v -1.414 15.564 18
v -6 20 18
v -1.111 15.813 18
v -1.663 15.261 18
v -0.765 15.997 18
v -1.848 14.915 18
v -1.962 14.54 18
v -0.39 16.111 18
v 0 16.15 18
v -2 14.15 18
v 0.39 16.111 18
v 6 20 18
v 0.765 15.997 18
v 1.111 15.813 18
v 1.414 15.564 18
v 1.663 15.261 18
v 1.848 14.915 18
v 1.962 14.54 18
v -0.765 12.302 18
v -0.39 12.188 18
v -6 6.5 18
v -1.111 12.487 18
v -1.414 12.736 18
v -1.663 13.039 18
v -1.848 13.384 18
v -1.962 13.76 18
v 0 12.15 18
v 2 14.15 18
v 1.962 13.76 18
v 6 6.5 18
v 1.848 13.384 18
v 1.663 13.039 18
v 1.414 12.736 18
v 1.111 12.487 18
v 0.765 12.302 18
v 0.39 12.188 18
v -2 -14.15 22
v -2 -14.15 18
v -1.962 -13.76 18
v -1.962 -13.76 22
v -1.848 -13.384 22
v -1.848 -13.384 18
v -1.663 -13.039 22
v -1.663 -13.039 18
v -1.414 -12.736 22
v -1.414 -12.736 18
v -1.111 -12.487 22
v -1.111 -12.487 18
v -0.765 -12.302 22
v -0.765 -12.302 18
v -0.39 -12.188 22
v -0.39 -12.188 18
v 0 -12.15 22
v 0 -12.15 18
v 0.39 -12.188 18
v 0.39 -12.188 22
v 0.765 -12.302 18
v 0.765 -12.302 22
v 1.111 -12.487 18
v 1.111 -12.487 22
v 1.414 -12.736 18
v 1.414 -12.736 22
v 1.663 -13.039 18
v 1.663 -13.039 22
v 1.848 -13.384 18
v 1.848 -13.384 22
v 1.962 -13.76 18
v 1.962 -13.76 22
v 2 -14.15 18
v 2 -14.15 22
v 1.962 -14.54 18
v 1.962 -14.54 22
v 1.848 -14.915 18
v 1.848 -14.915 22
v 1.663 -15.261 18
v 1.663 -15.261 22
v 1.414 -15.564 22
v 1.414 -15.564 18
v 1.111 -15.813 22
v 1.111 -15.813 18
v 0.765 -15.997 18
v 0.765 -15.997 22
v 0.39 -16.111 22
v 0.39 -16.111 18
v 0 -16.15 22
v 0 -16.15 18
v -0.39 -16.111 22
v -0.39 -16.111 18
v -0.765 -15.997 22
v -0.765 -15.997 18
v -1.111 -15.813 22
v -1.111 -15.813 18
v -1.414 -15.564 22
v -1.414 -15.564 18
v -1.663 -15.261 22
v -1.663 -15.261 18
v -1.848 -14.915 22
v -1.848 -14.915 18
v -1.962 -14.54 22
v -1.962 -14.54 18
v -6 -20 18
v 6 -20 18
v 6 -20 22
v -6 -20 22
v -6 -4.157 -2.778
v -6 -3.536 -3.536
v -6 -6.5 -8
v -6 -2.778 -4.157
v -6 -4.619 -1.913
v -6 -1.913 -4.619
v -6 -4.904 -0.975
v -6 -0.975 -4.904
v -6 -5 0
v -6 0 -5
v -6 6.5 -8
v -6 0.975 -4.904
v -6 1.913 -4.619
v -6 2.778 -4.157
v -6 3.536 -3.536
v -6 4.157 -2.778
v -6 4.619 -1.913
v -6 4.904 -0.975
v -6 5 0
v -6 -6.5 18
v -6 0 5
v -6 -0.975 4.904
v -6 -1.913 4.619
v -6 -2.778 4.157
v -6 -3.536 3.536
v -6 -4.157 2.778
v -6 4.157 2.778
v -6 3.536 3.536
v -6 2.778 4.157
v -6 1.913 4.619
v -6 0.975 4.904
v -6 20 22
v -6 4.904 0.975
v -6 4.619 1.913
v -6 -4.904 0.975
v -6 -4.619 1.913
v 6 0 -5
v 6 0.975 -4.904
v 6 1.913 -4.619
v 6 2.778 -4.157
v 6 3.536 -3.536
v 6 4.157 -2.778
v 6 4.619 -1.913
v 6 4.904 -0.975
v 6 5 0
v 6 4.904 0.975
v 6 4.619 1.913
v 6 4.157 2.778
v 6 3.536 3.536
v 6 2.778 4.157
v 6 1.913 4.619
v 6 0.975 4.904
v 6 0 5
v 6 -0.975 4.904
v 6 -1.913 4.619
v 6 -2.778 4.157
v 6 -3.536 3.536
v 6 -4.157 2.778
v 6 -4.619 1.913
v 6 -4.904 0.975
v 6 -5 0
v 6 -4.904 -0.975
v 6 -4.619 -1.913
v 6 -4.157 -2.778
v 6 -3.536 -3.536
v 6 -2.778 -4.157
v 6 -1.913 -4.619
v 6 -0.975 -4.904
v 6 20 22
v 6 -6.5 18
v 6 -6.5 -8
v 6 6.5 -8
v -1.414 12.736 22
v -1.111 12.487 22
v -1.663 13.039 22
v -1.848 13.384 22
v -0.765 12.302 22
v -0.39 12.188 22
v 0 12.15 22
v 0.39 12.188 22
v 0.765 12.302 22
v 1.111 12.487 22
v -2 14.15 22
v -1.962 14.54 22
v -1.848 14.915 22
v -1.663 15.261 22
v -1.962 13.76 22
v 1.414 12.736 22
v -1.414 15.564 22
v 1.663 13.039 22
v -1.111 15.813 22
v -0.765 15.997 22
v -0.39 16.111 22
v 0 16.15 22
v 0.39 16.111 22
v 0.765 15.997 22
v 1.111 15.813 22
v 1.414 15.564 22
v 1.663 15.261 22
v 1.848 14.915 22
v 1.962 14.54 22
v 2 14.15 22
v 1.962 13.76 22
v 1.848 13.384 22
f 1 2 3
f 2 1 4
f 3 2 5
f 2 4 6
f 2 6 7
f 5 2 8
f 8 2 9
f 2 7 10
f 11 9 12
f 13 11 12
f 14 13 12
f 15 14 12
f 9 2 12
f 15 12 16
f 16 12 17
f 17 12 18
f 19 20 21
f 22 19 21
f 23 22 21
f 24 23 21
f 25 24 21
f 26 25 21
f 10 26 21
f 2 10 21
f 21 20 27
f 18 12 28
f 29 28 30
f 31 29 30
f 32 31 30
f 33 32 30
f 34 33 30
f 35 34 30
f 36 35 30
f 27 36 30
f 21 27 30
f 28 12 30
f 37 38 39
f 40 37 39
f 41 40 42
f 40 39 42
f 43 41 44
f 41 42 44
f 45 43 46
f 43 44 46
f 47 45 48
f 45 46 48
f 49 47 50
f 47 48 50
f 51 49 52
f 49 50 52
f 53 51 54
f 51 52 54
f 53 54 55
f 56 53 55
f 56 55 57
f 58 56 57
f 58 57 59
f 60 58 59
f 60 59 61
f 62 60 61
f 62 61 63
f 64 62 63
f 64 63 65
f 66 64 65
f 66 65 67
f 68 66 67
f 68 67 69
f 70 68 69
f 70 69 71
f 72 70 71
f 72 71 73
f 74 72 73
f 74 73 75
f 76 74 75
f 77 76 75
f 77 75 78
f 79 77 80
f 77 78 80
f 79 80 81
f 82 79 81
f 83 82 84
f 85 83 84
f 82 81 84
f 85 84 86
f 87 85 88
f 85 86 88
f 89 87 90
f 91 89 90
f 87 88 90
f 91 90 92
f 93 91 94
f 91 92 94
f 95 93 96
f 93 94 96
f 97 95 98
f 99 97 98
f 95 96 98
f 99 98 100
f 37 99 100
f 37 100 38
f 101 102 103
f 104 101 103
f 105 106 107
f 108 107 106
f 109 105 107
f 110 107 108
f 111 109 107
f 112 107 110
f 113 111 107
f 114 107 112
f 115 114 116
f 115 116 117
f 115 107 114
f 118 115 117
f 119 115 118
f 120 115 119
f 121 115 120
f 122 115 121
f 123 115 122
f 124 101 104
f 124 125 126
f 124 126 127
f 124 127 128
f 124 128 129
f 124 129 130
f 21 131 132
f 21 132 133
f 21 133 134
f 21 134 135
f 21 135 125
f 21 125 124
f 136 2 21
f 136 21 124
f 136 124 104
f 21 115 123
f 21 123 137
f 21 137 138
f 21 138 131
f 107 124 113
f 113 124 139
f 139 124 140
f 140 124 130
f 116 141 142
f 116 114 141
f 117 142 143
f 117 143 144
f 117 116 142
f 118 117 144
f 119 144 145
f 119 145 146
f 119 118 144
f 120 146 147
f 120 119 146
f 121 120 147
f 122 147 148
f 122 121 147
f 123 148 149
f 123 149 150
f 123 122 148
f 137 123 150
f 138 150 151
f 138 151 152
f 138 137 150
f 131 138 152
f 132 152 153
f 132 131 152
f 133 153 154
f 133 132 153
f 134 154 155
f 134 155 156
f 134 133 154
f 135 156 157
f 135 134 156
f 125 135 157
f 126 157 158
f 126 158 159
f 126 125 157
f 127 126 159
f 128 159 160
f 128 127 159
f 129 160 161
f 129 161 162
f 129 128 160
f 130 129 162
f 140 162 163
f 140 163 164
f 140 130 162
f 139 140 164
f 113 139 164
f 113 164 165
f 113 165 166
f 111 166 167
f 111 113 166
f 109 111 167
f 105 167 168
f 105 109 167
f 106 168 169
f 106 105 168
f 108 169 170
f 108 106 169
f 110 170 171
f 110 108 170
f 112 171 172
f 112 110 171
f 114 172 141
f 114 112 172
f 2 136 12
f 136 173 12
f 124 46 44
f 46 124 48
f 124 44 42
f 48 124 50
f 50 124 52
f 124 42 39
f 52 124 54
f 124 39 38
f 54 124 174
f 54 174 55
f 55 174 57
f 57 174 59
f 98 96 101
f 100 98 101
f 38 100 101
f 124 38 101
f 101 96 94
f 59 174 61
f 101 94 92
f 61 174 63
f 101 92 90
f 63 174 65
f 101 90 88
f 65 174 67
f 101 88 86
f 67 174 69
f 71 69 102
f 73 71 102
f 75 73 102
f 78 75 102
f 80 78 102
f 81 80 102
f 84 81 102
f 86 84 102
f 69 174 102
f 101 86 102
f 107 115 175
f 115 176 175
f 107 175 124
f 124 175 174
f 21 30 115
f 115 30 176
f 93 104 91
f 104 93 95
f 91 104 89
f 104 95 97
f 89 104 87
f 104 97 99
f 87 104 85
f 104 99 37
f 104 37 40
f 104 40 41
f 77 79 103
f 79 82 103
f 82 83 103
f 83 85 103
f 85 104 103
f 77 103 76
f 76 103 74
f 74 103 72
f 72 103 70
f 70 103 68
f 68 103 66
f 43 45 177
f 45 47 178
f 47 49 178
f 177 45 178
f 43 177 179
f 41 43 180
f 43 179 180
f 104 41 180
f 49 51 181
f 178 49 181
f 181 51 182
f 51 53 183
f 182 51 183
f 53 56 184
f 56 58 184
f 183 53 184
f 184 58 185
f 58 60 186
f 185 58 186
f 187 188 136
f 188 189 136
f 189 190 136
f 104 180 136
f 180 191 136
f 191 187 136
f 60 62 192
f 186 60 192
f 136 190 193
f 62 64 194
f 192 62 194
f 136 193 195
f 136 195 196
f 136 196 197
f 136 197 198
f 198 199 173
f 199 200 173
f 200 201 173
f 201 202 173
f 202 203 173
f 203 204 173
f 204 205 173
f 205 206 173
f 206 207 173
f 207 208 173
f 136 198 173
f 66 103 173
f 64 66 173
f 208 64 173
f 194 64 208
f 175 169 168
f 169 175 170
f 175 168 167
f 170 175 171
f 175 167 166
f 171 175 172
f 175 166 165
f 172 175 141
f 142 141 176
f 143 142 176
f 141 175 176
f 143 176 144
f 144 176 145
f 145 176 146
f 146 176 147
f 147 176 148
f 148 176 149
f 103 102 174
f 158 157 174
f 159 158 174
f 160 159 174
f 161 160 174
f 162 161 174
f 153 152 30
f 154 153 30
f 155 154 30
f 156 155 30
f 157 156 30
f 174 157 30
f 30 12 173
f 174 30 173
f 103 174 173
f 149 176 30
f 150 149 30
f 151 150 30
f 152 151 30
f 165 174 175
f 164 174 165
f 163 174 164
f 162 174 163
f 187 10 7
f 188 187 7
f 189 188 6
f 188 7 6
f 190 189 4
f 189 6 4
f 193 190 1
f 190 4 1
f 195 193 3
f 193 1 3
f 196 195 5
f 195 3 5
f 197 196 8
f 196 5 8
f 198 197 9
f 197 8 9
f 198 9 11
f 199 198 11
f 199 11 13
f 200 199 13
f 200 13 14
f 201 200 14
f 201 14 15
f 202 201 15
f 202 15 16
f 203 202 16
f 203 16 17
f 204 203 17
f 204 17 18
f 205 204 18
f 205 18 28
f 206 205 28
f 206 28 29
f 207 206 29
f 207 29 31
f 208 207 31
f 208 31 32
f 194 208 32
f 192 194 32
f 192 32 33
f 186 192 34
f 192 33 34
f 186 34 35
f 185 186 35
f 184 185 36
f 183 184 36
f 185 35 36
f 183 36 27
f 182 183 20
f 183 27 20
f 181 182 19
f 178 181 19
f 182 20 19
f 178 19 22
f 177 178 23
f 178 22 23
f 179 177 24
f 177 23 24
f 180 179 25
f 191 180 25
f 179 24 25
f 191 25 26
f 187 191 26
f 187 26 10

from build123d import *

# Parameters (mm, degrees)
SKETCH1_R           = 5
BOSS_EXTRUDE1_DEPTH = 6
SKETCH2_R           = 2
CUT_EXTRUDE1_DEPTH  = 5


with BuildPart() as part:
    # Sketch1 → Boss-Extrude1 (new body, symmetric)
    with BuildSketch(Plane(origin=(0, 0, 0), x_dir=(0, 0, -1), z_dir=(1, 0, 0))):
        Polygon((-22, -20), (-22, 20), (-18, 20), (-18, 6.5), (8, 6.5), (8, -6.5), (-18, -6.5), (-18, -20), align=None)
        Circle(SKETCH1_R, mode=Mode.SUBTRACT)
    extrude(amount=BOSS_EXTRUDE1_DEPTH, both=True)

    # Sketch2 → Cut-Extrude1 (cut, through all)
    with BuildSketch(Plane(origin=(0, 0, 18), x_dir=(-1, 0, 0), z_dir=(0, 0, -1))):
        with Locations((0, 14.149716829)):
            Circle(SKETCH2_R)
        with Locations((0, -14.149716829)):
            Circle(SKETCH2_R)
    extrude(amount=-CUT_EXTRUDE1_DEPTH, mode=Mode.SUBTRACT)


solid = part.part
